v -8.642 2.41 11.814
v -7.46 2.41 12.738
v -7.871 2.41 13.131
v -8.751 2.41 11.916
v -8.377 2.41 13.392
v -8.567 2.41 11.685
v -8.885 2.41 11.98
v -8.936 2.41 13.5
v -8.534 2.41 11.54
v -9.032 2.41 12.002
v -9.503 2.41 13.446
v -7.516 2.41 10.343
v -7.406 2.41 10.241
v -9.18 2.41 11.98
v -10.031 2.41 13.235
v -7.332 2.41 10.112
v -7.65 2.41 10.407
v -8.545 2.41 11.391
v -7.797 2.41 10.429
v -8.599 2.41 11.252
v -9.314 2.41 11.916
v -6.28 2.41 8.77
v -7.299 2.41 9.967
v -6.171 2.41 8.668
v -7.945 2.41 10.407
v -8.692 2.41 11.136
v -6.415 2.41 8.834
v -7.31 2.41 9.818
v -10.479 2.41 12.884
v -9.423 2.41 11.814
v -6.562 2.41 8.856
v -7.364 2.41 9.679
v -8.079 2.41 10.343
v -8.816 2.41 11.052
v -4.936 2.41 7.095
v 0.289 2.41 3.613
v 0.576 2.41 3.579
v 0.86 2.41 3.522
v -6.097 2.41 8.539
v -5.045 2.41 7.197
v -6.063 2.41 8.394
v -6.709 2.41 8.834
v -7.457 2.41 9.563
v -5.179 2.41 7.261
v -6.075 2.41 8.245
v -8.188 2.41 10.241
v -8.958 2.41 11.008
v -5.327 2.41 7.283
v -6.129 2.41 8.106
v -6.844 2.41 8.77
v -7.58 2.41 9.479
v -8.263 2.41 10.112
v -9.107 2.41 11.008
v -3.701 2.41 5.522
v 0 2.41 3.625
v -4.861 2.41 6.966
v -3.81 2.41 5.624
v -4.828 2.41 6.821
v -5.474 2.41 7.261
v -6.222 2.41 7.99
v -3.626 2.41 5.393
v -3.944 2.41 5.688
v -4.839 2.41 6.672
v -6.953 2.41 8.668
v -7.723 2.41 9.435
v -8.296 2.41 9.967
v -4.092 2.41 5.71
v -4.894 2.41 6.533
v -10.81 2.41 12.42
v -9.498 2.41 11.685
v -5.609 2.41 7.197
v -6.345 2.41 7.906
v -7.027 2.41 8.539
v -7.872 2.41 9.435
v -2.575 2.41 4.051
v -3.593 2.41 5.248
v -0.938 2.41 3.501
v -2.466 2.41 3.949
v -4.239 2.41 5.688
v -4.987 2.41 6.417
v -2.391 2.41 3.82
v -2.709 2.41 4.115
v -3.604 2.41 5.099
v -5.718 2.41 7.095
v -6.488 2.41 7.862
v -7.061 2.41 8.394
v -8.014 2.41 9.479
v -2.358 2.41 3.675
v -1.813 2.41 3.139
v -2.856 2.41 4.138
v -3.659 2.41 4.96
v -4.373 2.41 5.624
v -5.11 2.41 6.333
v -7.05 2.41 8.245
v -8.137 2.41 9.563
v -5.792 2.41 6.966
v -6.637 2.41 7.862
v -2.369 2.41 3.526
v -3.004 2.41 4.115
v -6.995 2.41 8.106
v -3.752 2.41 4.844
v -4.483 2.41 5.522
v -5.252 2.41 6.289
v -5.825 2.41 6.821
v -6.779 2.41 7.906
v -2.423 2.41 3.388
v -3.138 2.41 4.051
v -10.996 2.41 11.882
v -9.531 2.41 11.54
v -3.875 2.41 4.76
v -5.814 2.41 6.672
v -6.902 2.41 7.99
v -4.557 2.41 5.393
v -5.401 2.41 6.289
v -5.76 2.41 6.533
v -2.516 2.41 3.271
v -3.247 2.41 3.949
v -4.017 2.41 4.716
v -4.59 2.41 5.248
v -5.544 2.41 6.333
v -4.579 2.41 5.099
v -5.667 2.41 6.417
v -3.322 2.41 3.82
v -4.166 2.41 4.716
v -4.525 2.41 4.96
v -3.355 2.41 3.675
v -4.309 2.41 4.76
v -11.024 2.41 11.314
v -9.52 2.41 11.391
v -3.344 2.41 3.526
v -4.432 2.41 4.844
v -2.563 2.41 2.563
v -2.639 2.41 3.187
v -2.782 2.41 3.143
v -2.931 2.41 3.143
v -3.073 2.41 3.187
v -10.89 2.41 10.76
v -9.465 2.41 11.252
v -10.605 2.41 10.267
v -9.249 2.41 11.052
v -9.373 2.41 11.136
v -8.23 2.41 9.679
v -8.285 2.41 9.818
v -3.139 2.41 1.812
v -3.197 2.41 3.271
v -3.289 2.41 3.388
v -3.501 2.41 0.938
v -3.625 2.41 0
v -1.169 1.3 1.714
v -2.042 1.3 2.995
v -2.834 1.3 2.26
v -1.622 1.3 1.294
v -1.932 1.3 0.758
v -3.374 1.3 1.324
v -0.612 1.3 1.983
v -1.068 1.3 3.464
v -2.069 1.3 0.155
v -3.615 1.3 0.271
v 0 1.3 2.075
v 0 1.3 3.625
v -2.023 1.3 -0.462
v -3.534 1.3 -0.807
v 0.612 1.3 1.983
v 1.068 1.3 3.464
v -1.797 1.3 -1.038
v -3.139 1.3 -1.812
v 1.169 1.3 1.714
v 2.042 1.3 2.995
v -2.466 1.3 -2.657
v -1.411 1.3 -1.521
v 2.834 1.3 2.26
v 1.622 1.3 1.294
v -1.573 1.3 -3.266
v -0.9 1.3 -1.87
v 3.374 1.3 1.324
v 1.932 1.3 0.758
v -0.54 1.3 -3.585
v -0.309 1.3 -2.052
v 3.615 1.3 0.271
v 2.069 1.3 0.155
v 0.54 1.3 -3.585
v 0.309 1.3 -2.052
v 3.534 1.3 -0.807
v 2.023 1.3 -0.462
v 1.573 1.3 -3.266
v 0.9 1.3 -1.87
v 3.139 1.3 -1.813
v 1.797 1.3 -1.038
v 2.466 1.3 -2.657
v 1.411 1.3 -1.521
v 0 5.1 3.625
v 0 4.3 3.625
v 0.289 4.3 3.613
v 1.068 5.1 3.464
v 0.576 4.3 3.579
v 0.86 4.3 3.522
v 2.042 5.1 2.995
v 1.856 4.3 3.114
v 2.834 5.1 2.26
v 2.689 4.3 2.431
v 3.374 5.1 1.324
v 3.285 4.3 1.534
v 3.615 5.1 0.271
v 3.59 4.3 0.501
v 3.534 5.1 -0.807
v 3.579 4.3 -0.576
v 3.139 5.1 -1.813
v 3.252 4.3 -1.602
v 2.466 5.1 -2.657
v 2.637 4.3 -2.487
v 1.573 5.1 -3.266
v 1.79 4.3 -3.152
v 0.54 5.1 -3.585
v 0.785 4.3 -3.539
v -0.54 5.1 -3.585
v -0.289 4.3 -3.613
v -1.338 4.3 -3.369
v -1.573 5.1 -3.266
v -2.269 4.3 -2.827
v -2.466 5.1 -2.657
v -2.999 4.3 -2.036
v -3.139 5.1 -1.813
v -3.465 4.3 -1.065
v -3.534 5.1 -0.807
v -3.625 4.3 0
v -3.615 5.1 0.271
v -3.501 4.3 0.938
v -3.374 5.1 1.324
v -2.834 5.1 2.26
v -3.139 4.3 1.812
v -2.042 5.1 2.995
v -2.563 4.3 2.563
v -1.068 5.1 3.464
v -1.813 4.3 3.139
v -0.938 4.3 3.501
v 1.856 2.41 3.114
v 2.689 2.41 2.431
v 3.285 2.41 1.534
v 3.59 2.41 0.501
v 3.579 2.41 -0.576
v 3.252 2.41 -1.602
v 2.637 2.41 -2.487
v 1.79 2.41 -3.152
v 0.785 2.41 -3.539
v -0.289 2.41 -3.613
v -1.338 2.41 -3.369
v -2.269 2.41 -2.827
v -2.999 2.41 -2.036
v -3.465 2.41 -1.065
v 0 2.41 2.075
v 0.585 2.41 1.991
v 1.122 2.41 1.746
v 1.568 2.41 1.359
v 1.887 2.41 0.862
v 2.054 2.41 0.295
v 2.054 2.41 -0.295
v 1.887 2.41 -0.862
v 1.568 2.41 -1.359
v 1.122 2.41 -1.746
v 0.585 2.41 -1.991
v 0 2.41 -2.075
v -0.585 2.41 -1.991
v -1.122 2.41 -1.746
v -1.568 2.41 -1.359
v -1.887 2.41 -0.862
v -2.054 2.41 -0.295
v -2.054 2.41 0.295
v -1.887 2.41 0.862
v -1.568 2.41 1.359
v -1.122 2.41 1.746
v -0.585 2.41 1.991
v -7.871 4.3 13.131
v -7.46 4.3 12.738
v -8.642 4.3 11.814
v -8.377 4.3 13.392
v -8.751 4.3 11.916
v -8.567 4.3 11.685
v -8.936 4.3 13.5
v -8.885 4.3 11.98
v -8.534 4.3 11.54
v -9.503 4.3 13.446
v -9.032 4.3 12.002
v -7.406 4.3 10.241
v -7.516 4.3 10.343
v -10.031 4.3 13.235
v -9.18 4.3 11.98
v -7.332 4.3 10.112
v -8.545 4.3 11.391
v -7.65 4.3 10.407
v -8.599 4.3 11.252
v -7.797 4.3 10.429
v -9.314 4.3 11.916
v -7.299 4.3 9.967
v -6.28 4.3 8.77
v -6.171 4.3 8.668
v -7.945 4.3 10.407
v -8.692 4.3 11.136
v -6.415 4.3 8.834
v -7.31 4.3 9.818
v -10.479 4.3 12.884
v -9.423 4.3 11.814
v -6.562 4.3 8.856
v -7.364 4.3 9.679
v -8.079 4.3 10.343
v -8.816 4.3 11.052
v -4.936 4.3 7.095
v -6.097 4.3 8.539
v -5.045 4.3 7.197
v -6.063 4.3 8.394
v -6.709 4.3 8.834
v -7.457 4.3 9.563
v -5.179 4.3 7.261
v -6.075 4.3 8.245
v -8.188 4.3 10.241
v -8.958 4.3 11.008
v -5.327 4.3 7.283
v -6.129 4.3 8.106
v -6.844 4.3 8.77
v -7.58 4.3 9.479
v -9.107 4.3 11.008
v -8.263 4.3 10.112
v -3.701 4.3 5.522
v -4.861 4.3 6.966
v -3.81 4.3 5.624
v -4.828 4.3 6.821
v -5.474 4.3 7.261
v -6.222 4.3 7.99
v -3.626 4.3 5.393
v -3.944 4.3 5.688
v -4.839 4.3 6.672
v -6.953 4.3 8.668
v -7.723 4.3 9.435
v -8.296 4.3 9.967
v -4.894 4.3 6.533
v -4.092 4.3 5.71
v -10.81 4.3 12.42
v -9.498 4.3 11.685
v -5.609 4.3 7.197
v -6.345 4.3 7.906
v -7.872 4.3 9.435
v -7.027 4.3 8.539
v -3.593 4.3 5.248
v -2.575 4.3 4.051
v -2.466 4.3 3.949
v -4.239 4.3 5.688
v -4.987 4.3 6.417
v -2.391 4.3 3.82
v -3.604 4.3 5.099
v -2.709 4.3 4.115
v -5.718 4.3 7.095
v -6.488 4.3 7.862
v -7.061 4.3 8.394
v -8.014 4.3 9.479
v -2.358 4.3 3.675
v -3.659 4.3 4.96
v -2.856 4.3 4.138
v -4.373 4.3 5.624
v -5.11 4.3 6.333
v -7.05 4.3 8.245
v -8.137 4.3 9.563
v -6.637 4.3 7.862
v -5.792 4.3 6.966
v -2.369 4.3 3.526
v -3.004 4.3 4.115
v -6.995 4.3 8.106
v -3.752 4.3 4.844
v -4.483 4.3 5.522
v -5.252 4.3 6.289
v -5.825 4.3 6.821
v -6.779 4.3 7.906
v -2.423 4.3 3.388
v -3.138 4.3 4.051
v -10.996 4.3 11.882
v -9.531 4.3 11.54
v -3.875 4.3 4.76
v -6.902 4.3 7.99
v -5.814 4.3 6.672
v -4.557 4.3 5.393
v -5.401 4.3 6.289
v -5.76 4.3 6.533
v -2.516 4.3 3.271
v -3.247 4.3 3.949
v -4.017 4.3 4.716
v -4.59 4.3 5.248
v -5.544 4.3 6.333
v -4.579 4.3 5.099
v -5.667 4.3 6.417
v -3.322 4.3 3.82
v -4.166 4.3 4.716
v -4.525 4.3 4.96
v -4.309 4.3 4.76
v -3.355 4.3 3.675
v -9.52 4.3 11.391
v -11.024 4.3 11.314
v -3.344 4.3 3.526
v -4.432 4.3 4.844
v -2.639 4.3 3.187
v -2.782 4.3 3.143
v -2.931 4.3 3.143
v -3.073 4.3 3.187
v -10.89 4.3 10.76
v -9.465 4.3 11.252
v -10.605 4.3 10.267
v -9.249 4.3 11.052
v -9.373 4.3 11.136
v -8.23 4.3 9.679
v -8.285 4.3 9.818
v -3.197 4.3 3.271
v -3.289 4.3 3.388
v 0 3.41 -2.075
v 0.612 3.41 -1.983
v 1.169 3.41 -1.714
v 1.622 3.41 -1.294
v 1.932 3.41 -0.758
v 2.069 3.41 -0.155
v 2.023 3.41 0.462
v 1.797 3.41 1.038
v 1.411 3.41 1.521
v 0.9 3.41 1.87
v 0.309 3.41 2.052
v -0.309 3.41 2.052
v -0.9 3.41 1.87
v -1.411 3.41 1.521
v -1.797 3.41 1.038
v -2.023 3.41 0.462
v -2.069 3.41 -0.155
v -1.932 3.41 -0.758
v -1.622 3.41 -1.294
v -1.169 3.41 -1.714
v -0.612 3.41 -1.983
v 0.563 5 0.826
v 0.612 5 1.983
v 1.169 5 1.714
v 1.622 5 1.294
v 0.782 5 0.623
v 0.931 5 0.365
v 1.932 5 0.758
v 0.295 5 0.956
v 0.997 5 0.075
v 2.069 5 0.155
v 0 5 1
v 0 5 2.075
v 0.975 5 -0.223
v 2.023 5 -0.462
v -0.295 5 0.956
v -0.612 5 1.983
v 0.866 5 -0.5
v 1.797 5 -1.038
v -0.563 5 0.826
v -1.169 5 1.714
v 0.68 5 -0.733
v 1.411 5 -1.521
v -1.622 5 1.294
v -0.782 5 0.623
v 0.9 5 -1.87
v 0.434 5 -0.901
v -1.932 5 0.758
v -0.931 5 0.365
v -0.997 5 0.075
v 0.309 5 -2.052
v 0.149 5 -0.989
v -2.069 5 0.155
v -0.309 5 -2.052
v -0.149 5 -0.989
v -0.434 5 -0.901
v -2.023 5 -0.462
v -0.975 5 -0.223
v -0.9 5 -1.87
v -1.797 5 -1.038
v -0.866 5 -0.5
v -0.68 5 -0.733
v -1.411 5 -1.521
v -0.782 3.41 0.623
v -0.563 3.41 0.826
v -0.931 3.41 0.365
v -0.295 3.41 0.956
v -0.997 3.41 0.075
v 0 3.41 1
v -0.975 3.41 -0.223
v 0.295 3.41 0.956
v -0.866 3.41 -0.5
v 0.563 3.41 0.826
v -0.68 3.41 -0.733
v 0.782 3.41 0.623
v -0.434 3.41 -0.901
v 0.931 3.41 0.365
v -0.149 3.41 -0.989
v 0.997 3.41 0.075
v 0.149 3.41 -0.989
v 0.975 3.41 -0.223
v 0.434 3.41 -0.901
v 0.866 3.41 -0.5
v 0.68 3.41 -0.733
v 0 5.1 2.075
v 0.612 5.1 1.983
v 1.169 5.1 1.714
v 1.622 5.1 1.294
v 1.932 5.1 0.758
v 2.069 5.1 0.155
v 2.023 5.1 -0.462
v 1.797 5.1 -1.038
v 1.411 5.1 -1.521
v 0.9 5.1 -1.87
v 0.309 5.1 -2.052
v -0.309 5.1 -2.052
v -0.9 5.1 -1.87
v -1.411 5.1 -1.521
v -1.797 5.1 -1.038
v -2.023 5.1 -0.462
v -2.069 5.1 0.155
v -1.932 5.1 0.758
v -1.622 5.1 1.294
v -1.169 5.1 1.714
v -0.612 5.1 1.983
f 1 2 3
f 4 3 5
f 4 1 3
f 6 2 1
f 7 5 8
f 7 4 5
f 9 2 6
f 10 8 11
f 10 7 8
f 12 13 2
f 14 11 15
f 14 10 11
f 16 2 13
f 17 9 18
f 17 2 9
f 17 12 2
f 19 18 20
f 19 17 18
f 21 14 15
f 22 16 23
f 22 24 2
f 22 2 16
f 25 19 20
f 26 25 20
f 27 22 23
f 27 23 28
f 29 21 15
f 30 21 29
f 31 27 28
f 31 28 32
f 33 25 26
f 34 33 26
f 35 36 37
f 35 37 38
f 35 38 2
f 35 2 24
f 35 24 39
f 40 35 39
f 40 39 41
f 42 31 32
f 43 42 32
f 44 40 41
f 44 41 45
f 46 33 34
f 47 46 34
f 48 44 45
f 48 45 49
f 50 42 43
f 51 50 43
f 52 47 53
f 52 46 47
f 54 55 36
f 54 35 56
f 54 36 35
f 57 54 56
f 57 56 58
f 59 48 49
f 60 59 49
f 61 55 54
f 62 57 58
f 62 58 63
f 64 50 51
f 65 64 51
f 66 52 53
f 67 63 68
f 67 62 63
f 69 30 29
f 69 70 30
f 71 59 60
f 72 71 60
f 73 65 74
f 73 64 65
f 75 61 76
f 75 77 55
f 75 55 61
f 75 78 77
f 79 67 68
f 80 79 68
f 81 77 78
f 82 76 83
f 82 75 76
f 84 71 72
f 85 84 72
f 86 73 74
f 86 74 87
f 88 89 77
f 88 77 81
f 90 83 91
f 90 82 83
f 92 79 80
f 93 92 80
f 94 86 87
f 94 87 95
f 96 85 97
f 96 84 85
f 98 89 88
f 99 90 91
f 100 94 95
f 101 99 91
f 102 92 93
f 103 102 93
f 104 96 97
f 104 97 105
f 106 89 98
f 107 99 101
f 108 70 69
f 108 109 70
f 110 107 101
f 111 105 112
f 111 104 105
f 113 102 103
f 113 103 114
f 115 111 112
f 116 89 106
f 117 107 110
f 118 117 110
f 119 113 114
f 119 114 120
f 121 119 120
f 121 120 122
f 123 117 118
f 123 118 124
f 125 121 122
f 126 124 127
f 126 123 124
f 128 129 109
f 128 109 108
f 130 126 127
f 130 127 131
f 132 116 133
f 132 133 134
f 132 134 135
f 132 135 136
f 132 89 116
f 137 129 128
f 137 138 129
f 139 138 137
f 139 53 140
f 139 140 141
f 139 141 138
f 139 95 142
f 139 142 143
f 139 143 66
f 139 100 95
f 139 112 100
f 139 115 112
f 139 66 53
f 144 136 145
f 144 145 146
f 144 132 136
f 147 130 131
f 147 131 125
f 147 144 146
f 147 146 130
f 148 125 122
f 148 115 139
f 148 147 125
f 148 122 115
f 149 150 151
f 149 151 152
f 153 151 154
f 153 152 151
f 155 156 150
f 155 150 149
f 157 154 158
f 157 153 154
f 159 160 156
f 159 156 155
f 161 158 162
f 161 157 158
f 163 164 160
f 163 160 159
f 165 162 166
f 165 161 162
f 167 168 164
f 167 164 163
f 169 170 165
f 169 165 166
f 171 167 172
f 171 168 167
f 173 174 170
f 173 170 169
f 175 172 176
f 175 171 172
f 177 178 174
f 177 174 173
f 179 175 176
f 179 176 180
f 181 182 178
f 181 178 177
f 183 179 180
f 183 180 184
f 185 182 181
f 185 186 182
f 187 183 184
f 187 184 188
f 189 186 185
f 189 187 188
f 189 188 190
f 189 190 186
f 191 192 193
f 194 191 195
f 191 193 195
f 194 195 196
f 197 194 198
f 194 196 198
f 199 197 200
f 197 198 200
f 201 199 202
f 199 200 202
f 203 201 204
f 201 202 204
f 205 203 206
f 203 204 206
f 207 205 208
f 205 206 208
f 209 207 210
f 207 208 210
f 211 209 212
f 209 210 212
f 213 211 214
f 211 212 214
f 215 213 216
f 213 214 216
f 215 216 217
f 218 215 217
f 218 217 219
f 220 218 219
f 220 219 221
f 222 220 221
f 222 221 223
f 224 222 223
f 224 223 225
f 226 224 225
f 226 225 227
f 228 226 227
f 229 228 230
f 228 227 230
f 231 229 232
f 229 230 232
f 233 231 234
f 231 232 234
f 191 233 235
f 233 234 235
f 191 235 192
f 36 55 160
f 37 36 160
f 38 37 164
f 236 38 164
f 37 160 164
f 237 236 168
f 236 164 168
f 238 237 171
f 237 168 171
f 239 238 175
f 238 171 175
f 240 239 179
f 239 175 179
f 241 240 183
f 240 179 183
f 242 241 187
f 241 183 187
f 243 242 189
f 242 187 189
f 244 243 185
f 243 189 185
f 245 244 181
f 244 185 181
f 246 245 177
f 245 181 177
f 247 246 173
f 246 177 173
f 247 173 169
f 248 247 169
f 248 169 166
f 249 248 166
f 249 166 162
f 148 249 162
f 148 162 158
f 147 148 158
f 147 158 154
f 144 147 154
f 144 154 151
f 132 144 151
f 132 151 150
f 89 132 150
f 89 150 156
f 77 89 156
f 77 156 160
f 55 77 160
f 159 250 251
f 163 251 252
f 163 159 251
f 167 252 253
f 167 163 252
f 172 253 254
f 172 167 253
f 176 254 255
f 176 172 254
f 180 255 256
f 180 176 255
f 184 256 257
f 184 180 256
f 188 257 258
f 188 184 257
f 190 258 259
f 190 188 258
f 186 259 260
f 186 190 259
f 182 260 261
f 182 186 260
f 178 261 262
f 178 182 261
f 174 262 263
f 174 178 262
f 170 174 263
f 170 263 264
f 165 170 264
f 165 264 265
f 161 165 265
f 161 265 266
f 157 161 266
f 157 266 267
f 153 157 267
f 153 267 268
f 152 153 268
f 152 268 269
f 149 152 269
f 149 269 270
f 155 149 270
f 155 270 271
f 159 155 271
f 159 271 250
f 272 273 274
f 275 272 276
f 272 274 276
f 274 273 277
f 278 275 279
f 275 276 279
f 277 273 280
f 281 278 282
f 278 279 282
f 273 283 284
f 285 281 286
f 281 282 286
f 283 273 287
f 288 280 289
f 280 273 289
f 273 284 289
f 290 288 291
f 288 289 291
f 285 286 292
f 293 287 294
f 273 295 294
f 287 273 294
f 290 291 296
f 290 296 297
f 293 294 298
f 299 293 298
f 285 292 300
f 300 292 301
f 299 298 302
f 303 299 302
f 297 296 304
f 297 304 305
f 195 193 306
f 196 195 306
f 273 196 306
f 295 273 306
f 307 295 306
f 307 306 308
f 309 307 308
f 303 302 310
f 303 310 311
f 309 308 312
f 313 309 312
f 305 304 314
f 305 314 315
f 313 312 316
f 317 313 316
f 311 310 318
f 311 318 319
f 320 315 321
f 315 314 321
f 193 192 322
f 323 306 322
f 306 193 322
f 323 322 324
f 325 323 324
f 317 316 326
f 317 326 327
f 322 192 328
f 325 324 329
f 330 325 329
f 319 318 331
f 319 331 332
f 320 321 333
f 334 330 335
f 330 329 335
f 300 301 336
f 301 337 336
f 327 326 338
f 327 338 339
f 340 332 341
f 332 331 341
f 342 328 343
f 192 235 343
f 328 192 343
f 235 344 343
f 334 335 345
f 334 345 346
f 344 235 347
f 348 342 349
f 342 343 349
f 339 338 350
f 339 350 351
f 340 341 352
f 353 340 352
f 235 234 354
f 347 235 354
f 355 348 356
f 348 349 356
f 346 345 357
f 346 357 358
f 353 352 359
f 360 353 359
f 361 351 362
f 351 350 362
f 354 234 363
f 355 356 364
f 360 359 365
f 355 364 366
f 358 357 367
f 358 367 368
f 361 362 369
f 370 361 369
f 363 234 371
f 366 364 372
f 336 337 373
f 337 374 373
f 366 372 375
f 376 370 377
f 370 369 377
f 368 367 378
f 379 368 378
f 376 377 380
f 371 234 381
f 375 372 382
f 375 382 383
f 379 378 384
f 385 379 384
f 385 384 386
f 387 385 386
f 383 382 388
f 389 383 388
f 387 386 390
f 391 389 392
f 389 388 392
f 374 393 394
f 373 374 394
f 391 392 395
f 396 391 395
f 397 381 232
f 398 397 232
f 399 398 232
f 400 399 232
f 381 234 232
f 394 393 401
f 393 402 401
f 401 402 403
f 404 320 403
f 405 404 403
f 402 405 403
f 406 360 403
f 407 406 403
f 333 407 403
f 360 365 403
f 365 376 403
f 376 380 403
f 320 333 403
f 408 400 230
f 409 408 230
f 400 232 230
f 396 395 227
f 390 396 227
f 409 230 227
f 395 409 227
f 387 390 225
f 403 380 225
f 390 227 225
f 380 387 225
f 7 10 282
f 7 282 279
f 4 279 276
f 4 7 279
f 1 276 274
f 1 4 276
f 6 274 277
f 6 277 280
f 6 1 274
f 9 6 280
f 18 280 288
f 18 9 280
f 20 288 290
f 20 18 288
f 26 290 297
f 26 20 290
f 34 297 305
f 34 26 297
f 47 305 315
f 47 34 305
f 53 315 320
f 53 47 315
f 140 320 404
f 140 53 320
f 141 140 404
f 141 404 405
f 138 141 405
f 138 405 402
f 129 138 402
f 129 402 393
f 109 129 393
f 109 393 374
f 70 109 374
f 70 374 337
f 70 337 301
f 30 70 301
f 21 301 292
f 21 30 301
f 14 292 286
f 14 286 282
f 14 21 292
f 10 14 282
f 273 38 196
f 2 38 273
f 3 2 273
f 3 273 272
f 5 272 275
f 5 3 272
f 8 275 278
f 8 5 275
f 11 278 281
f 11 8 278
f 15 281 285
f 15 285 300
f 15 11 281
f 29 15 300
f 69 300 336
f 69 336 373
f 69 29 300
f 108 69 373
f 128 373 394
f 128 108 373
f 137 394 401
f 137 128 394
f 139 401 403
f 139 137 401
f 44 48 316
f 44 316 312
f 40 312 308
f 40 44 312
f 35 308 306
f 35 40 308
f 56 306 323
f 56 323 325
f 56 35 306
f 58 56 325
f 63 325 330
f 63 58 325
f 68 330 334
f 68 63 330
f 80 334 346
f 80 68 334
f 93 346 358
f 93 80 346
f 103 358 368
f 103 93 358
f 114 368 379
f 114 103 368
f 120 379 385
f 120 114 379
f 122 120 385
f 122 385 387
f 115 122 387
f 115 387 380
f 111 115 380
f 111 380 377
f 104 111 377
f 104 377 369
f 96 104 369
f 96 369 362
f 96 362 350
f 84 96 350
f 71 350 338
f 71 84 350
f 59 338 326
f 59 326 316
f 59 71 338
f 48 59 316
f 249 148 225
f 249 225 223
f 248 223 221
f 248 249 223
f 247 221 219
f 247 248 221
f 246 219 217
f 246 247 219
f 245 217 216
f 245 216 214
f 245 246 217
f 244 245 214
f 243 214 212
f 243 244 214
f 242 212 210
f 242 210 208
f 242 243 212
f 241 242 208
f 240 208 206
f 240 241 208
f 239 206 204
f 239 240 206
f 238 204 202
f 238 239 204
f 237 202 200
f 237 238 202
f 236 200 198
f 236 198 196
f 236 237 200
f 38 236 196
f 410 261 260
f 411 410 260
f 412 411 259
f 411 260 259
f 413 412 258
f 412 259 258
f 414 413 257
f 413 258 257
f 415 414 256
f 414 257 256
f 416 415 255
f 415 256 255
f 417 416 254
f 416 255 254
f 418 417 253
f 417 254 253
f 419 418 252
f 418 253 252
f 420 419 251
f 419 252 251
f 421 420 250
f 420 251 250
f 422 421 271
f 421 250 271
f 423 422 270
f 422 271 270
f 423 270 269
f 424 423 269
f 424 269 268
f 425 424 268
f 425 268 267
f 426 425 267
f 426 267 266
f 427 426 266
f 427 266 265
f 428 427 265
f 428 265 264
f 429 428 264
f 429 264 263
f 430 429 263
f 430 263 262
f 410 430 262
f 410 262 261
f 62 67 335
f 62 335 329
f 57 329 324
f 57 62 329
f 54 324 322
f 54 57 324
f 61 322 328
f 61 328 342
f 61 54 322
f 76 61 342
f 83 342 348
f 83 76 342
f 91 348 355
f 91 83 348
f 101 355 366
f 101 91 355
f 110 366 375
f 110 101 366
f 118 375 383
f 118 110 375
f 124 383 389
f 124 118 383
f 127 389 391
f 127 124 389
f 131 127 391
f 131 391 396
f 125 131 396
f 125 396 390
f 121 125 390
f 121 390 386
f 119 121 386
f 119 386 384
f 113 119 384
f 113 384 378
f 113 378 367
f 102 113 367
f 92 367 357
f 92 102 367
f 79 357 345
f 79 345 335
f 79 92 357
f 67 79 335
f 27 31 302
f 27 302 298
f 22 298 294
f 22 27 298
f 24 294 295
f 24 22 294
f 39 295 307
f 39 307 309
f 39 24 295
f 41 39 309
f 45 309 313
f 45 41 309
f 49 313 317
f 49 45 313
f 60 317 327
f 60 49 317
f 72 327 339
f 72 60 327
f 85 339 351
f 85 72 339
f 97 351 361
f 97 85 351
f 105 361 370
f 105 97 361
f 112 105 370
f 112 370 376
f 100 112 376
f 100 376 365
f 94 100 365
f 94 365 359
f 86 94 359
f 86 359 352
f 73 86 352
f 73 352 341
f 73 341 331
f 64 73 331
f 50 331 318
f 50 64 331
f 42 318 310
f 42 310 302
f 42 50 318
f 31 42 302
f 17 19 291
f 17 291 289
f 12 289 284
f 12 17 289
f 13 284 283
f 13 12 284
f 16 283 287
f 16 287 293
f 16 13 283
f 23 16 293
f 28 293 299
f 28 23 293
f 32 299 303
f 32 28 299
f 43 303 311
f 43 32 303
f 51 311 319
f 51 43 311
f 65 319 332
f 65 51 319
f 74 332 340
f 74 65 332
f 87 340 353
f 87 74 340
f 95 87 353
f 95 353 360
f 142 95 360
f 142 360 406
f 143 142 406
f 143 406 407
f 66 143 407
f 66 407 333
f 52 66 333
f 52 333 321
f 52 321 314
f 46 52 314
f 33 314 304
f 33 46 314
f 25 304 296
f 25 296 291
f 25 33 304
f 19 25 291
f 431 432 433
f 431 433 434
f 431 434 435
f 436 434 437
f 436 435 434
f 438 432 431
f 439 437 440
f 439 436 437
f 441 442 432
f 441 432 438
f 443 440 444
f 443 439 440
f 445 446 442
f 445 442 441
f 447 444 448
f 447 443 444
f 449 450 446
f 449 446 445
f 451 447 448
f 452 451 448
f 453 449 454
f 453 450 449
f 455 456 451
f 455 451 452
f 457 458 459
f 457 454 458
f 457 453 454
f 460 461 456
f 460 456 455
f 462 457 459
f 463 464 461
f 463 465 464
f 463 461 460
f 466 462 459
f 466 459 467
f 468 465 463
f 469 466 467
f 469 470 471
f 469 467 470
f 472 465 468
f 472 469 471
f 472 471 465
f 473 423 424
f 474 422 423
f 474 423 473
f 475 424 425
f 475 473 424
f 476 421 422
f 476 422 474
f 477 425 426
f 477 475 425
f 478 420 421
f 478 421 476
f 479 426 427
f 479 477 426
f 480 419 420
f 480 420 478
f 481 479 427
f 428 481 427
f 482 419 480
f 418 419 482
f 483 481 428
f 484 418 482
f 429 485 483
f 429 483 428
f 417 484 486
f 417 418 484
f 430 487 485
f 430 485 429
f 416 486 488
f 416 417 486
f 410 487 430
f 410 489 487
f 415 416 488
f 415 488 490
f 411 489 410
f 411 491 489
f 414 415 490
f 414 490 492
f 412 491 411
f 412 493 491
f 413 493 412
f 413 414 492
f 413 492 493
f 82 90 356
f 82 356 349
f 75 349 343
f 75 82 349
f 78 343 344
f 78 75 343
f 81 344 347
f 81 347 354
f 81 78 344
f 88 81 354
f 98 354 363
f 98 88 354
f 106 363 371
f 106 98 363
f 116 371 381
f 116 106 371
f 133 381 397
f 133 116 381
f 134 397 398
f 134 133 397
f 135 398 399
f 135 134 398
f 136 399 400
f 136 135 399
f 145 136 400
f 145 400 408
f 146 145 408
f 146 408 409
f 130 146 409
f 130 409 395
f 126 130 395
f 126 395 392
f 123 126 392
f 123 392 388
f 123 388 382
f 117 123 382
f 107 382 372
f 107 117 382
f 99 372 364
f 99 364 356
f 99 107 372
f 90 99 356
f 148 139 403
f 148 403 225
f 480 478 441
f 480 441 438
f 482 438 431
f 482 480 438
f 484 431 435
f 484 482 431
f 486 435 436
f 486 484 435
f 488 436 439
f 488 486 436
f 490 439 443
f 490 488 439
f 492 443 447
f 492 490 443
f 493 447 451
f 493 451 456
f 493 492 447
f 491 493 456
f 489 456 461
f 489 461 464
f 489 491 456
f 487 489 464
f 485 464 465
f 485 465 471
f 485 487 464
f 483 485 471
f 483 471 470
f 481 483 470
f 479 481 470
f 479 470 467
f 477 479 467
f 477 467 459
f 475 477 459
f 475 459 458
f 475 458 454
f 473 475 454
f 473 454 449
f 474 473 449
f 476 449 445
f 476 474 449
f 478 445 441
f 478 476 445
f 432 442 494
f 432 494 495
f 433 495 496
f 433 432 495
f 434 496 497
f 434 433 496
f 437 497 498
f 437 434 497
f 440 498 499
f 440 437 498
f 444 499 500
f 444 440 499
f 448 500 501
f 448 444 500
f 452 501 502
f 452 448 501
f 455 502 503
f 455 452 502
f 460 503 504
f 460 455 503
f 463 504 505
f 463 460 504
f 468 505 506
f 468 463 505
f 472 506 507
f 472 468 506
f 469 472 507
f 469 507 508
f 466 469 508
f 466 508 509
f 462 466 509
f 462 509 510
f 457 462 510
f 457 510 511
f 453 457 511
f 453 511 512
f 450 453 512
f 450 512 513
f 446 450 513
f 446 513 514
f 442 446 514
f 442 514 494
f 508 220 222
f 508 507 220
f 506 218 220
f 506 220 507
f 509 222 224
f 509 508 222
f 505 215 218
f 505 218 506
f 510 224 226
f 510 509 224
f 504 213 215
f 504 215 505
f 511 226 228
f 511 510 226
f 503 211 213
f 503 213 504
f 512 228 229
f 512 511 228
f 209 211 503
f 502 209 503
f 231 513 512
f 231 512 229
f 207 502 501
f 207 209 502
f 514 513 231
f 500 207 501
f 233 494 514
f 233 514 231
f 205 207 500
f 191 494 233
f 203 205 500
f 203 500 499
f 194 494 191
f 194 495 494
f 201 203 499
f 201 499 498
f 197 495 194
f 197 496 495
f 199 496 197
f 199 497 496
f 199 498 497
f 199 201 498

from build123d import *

# Parameters (mm, degrees)
SKETCH1_R           = 3.625
SKETCH1_R_2         = 2.075
BOSS_EXTRUDE1_DEPTH = 2.41
SKETCH2_R           = 1
SKETCH2_R_2         = 0.5
BOSS_EXTRUDE3_DEPTH = 1.89
BOSS_EXTRUDE4_START = 4.3
SKETCH1_2_R         = 3.625
SKETCH1_2_R_2       = 2.075
BOSS_EXTRUDE4_DEPTH = 0.8
SKETCH3_R           = 3.625
SKETCH3_R_2         = 2.075
CUT_EXTRUDE1_DEPTH  = 1.3
SKETCH4_R           = 2.075
SKETCH4_R_2         = 1
BOSS_EXTRUDE5_DEPTH = 0.7
SKETCH5_R           = 2.075
SKETCH5_R_2         = 1
CUT_EXTRUDE2_DEPTH  = 1


with BuildPart() as part:
    # Sketch1 → Boss-Extrude1 (new body)
    with BuildSketch(Plane(origin=(0, 0, 0), x_dir=(1, 0, 0), z_dir=(0, 1, 0))):
        with Locations(Location((0, 0, 0), (0, 0, 270))):
            Circle(SKETCH1_R)
        with Locations(Location((0, 0, 0), (0, 0, 270))):
            Circle(SKETCH1_R_2, mode=Mode.SUBTRACT)
    extrude(amount=BOSS_EXTRUDE1_DEPTH)

    # Sketch2 → Boss-Extrude3 (add)
    with BuildSketch(Plane(origin=(0, 2.41, 0), x_dir=(1, 0, 0), z_dir=(0, 1, 0))):
        with BuildLine():
            Line((-10.6054557, -10.267177528), (-3.625, 0))
            ThreePointArc((-3.625, 0), (2.238819707, 2.851019347), (0.859585555, -3.521610097))
            Line((0.859585555, -3.521610097), (-7.459503317, -12.737599274))
            ThreePointArc((-7.459503317, -12.737599274), (-10.267690381, -13.075364593), (-10.6054557, -10.267177528))
        make_face()
        with Locations(Location((0, 0, 0), (0, 0, 270))):
            Circle(SKETCH2_R, mode=Mode.SUBTRACT)
        with Locations(Location((-9.032479508, -11.502388401, 0), (0, 0, 270))):
            Circle(SKETCH2_R_2, mode=Mode.SUBTRACT)
        with Locations(Location((-7.797268635, -9.92941221, 0), (0, 0, 270))):
            Circle(SKETCH2_R_2, mode=Mode.SUBTRACT)
        with Locations(Location((-6.562057762, -8.356436018, 0), (0, 0, 270))):
            Circle(SKETCH2_R_2, mode=Mode.SUBTRACT)
        with Locations(Location((-5.32684689, -6.783459826, 0), (0, 0, 270))):
            Circle(SKETCH2_R_2, mode=Mode.SUBTRACT)
        with Locations(Location((-4.091636017, -5.210483635, 0), (0, 0, 270))):
            Circle(SKETCH2_R_2, mode=Mode.SUBTRACT)
        with Locations(Location((-2.856425144, -3.637507443, 0), (0, 0, 270))):
            Circle(SKETCH2_R_2, mode=Mode.SUBTRACT)
    extrude(amount=BOSS_EXTRUDE3_DEPTH)

    # Sketch1<2> → Boss-Extrude4 (add)
    with BuildSketch(Plane(origin=(0, 0, 0), x_dir=(1, 0, 0), z_dir=(0, 1, 0)).offset(BOSS_EXTRUDE4_START)):
        with Locations(Location((0, 0, 0), (0, 0, 270))):
            Circle(SKETCH1_2_R)
        with Locations(Location((0, 0, 0), (0, 0, 270))):
            Circle(SKETCH1_2_R_2, mode=Mode.SUBTRACT)
    extrude(amount=BOSS_EXTRUDE4_DEPTH)

    # Sketch3 → Cut-Extrude1 (cut)
    with BuildSketch(Plane.XZ):
        with Locations(Location((0, 0, 0), (0, 0, 270))):
            Circle(SKETCH3_R)
        with Locations(Location((0, 0, 0), (0, 0, 270))):
            Circle(SKETCH3_R_2, mode=Mode.SUBTRACT)
    extrude(amount=-CUT_EXTRUDE1_DEPTH, mode=Mode.SUBTRACT)

    # Sketch4 → Boss-Extrude5 (add)
    with BuildSketch(Plane(origin=(0, 4.3, 0), x_dir=(1, 0, 0), z_dir=(0, 1, 0))):
        with Locations(Location((0, 0, 0), (0, 0, 90))):
            Circle(SKETCH4_R)
        with Locations(Location((0, 0, 0), (0, 0, 270))):
            Circle(SKETCH4_R_2, mode=Mode.SUBTRACT)
    extrude(amount=BOSS_EXTRUDE5_DEPTH)

    # Sketch5 → Cut-Extrude2 (cut)
    with BuildSketch(Plane.XZ.offset(-2.41)):
        with Locations(Location((0, 0, 0), (0, 0, 270))):
            Circle(SKETCH5_R)
        with Locations(Location((0, 0, 0), (0, 0, 270))):
            Circle(SKETCH5_R_2, mode=Mode.SUBTRACT)
    extrude(amount=-CUT_EXTRUDE2_DEPTH, mode=Mode.SUBTRACT)


solid = part.part
